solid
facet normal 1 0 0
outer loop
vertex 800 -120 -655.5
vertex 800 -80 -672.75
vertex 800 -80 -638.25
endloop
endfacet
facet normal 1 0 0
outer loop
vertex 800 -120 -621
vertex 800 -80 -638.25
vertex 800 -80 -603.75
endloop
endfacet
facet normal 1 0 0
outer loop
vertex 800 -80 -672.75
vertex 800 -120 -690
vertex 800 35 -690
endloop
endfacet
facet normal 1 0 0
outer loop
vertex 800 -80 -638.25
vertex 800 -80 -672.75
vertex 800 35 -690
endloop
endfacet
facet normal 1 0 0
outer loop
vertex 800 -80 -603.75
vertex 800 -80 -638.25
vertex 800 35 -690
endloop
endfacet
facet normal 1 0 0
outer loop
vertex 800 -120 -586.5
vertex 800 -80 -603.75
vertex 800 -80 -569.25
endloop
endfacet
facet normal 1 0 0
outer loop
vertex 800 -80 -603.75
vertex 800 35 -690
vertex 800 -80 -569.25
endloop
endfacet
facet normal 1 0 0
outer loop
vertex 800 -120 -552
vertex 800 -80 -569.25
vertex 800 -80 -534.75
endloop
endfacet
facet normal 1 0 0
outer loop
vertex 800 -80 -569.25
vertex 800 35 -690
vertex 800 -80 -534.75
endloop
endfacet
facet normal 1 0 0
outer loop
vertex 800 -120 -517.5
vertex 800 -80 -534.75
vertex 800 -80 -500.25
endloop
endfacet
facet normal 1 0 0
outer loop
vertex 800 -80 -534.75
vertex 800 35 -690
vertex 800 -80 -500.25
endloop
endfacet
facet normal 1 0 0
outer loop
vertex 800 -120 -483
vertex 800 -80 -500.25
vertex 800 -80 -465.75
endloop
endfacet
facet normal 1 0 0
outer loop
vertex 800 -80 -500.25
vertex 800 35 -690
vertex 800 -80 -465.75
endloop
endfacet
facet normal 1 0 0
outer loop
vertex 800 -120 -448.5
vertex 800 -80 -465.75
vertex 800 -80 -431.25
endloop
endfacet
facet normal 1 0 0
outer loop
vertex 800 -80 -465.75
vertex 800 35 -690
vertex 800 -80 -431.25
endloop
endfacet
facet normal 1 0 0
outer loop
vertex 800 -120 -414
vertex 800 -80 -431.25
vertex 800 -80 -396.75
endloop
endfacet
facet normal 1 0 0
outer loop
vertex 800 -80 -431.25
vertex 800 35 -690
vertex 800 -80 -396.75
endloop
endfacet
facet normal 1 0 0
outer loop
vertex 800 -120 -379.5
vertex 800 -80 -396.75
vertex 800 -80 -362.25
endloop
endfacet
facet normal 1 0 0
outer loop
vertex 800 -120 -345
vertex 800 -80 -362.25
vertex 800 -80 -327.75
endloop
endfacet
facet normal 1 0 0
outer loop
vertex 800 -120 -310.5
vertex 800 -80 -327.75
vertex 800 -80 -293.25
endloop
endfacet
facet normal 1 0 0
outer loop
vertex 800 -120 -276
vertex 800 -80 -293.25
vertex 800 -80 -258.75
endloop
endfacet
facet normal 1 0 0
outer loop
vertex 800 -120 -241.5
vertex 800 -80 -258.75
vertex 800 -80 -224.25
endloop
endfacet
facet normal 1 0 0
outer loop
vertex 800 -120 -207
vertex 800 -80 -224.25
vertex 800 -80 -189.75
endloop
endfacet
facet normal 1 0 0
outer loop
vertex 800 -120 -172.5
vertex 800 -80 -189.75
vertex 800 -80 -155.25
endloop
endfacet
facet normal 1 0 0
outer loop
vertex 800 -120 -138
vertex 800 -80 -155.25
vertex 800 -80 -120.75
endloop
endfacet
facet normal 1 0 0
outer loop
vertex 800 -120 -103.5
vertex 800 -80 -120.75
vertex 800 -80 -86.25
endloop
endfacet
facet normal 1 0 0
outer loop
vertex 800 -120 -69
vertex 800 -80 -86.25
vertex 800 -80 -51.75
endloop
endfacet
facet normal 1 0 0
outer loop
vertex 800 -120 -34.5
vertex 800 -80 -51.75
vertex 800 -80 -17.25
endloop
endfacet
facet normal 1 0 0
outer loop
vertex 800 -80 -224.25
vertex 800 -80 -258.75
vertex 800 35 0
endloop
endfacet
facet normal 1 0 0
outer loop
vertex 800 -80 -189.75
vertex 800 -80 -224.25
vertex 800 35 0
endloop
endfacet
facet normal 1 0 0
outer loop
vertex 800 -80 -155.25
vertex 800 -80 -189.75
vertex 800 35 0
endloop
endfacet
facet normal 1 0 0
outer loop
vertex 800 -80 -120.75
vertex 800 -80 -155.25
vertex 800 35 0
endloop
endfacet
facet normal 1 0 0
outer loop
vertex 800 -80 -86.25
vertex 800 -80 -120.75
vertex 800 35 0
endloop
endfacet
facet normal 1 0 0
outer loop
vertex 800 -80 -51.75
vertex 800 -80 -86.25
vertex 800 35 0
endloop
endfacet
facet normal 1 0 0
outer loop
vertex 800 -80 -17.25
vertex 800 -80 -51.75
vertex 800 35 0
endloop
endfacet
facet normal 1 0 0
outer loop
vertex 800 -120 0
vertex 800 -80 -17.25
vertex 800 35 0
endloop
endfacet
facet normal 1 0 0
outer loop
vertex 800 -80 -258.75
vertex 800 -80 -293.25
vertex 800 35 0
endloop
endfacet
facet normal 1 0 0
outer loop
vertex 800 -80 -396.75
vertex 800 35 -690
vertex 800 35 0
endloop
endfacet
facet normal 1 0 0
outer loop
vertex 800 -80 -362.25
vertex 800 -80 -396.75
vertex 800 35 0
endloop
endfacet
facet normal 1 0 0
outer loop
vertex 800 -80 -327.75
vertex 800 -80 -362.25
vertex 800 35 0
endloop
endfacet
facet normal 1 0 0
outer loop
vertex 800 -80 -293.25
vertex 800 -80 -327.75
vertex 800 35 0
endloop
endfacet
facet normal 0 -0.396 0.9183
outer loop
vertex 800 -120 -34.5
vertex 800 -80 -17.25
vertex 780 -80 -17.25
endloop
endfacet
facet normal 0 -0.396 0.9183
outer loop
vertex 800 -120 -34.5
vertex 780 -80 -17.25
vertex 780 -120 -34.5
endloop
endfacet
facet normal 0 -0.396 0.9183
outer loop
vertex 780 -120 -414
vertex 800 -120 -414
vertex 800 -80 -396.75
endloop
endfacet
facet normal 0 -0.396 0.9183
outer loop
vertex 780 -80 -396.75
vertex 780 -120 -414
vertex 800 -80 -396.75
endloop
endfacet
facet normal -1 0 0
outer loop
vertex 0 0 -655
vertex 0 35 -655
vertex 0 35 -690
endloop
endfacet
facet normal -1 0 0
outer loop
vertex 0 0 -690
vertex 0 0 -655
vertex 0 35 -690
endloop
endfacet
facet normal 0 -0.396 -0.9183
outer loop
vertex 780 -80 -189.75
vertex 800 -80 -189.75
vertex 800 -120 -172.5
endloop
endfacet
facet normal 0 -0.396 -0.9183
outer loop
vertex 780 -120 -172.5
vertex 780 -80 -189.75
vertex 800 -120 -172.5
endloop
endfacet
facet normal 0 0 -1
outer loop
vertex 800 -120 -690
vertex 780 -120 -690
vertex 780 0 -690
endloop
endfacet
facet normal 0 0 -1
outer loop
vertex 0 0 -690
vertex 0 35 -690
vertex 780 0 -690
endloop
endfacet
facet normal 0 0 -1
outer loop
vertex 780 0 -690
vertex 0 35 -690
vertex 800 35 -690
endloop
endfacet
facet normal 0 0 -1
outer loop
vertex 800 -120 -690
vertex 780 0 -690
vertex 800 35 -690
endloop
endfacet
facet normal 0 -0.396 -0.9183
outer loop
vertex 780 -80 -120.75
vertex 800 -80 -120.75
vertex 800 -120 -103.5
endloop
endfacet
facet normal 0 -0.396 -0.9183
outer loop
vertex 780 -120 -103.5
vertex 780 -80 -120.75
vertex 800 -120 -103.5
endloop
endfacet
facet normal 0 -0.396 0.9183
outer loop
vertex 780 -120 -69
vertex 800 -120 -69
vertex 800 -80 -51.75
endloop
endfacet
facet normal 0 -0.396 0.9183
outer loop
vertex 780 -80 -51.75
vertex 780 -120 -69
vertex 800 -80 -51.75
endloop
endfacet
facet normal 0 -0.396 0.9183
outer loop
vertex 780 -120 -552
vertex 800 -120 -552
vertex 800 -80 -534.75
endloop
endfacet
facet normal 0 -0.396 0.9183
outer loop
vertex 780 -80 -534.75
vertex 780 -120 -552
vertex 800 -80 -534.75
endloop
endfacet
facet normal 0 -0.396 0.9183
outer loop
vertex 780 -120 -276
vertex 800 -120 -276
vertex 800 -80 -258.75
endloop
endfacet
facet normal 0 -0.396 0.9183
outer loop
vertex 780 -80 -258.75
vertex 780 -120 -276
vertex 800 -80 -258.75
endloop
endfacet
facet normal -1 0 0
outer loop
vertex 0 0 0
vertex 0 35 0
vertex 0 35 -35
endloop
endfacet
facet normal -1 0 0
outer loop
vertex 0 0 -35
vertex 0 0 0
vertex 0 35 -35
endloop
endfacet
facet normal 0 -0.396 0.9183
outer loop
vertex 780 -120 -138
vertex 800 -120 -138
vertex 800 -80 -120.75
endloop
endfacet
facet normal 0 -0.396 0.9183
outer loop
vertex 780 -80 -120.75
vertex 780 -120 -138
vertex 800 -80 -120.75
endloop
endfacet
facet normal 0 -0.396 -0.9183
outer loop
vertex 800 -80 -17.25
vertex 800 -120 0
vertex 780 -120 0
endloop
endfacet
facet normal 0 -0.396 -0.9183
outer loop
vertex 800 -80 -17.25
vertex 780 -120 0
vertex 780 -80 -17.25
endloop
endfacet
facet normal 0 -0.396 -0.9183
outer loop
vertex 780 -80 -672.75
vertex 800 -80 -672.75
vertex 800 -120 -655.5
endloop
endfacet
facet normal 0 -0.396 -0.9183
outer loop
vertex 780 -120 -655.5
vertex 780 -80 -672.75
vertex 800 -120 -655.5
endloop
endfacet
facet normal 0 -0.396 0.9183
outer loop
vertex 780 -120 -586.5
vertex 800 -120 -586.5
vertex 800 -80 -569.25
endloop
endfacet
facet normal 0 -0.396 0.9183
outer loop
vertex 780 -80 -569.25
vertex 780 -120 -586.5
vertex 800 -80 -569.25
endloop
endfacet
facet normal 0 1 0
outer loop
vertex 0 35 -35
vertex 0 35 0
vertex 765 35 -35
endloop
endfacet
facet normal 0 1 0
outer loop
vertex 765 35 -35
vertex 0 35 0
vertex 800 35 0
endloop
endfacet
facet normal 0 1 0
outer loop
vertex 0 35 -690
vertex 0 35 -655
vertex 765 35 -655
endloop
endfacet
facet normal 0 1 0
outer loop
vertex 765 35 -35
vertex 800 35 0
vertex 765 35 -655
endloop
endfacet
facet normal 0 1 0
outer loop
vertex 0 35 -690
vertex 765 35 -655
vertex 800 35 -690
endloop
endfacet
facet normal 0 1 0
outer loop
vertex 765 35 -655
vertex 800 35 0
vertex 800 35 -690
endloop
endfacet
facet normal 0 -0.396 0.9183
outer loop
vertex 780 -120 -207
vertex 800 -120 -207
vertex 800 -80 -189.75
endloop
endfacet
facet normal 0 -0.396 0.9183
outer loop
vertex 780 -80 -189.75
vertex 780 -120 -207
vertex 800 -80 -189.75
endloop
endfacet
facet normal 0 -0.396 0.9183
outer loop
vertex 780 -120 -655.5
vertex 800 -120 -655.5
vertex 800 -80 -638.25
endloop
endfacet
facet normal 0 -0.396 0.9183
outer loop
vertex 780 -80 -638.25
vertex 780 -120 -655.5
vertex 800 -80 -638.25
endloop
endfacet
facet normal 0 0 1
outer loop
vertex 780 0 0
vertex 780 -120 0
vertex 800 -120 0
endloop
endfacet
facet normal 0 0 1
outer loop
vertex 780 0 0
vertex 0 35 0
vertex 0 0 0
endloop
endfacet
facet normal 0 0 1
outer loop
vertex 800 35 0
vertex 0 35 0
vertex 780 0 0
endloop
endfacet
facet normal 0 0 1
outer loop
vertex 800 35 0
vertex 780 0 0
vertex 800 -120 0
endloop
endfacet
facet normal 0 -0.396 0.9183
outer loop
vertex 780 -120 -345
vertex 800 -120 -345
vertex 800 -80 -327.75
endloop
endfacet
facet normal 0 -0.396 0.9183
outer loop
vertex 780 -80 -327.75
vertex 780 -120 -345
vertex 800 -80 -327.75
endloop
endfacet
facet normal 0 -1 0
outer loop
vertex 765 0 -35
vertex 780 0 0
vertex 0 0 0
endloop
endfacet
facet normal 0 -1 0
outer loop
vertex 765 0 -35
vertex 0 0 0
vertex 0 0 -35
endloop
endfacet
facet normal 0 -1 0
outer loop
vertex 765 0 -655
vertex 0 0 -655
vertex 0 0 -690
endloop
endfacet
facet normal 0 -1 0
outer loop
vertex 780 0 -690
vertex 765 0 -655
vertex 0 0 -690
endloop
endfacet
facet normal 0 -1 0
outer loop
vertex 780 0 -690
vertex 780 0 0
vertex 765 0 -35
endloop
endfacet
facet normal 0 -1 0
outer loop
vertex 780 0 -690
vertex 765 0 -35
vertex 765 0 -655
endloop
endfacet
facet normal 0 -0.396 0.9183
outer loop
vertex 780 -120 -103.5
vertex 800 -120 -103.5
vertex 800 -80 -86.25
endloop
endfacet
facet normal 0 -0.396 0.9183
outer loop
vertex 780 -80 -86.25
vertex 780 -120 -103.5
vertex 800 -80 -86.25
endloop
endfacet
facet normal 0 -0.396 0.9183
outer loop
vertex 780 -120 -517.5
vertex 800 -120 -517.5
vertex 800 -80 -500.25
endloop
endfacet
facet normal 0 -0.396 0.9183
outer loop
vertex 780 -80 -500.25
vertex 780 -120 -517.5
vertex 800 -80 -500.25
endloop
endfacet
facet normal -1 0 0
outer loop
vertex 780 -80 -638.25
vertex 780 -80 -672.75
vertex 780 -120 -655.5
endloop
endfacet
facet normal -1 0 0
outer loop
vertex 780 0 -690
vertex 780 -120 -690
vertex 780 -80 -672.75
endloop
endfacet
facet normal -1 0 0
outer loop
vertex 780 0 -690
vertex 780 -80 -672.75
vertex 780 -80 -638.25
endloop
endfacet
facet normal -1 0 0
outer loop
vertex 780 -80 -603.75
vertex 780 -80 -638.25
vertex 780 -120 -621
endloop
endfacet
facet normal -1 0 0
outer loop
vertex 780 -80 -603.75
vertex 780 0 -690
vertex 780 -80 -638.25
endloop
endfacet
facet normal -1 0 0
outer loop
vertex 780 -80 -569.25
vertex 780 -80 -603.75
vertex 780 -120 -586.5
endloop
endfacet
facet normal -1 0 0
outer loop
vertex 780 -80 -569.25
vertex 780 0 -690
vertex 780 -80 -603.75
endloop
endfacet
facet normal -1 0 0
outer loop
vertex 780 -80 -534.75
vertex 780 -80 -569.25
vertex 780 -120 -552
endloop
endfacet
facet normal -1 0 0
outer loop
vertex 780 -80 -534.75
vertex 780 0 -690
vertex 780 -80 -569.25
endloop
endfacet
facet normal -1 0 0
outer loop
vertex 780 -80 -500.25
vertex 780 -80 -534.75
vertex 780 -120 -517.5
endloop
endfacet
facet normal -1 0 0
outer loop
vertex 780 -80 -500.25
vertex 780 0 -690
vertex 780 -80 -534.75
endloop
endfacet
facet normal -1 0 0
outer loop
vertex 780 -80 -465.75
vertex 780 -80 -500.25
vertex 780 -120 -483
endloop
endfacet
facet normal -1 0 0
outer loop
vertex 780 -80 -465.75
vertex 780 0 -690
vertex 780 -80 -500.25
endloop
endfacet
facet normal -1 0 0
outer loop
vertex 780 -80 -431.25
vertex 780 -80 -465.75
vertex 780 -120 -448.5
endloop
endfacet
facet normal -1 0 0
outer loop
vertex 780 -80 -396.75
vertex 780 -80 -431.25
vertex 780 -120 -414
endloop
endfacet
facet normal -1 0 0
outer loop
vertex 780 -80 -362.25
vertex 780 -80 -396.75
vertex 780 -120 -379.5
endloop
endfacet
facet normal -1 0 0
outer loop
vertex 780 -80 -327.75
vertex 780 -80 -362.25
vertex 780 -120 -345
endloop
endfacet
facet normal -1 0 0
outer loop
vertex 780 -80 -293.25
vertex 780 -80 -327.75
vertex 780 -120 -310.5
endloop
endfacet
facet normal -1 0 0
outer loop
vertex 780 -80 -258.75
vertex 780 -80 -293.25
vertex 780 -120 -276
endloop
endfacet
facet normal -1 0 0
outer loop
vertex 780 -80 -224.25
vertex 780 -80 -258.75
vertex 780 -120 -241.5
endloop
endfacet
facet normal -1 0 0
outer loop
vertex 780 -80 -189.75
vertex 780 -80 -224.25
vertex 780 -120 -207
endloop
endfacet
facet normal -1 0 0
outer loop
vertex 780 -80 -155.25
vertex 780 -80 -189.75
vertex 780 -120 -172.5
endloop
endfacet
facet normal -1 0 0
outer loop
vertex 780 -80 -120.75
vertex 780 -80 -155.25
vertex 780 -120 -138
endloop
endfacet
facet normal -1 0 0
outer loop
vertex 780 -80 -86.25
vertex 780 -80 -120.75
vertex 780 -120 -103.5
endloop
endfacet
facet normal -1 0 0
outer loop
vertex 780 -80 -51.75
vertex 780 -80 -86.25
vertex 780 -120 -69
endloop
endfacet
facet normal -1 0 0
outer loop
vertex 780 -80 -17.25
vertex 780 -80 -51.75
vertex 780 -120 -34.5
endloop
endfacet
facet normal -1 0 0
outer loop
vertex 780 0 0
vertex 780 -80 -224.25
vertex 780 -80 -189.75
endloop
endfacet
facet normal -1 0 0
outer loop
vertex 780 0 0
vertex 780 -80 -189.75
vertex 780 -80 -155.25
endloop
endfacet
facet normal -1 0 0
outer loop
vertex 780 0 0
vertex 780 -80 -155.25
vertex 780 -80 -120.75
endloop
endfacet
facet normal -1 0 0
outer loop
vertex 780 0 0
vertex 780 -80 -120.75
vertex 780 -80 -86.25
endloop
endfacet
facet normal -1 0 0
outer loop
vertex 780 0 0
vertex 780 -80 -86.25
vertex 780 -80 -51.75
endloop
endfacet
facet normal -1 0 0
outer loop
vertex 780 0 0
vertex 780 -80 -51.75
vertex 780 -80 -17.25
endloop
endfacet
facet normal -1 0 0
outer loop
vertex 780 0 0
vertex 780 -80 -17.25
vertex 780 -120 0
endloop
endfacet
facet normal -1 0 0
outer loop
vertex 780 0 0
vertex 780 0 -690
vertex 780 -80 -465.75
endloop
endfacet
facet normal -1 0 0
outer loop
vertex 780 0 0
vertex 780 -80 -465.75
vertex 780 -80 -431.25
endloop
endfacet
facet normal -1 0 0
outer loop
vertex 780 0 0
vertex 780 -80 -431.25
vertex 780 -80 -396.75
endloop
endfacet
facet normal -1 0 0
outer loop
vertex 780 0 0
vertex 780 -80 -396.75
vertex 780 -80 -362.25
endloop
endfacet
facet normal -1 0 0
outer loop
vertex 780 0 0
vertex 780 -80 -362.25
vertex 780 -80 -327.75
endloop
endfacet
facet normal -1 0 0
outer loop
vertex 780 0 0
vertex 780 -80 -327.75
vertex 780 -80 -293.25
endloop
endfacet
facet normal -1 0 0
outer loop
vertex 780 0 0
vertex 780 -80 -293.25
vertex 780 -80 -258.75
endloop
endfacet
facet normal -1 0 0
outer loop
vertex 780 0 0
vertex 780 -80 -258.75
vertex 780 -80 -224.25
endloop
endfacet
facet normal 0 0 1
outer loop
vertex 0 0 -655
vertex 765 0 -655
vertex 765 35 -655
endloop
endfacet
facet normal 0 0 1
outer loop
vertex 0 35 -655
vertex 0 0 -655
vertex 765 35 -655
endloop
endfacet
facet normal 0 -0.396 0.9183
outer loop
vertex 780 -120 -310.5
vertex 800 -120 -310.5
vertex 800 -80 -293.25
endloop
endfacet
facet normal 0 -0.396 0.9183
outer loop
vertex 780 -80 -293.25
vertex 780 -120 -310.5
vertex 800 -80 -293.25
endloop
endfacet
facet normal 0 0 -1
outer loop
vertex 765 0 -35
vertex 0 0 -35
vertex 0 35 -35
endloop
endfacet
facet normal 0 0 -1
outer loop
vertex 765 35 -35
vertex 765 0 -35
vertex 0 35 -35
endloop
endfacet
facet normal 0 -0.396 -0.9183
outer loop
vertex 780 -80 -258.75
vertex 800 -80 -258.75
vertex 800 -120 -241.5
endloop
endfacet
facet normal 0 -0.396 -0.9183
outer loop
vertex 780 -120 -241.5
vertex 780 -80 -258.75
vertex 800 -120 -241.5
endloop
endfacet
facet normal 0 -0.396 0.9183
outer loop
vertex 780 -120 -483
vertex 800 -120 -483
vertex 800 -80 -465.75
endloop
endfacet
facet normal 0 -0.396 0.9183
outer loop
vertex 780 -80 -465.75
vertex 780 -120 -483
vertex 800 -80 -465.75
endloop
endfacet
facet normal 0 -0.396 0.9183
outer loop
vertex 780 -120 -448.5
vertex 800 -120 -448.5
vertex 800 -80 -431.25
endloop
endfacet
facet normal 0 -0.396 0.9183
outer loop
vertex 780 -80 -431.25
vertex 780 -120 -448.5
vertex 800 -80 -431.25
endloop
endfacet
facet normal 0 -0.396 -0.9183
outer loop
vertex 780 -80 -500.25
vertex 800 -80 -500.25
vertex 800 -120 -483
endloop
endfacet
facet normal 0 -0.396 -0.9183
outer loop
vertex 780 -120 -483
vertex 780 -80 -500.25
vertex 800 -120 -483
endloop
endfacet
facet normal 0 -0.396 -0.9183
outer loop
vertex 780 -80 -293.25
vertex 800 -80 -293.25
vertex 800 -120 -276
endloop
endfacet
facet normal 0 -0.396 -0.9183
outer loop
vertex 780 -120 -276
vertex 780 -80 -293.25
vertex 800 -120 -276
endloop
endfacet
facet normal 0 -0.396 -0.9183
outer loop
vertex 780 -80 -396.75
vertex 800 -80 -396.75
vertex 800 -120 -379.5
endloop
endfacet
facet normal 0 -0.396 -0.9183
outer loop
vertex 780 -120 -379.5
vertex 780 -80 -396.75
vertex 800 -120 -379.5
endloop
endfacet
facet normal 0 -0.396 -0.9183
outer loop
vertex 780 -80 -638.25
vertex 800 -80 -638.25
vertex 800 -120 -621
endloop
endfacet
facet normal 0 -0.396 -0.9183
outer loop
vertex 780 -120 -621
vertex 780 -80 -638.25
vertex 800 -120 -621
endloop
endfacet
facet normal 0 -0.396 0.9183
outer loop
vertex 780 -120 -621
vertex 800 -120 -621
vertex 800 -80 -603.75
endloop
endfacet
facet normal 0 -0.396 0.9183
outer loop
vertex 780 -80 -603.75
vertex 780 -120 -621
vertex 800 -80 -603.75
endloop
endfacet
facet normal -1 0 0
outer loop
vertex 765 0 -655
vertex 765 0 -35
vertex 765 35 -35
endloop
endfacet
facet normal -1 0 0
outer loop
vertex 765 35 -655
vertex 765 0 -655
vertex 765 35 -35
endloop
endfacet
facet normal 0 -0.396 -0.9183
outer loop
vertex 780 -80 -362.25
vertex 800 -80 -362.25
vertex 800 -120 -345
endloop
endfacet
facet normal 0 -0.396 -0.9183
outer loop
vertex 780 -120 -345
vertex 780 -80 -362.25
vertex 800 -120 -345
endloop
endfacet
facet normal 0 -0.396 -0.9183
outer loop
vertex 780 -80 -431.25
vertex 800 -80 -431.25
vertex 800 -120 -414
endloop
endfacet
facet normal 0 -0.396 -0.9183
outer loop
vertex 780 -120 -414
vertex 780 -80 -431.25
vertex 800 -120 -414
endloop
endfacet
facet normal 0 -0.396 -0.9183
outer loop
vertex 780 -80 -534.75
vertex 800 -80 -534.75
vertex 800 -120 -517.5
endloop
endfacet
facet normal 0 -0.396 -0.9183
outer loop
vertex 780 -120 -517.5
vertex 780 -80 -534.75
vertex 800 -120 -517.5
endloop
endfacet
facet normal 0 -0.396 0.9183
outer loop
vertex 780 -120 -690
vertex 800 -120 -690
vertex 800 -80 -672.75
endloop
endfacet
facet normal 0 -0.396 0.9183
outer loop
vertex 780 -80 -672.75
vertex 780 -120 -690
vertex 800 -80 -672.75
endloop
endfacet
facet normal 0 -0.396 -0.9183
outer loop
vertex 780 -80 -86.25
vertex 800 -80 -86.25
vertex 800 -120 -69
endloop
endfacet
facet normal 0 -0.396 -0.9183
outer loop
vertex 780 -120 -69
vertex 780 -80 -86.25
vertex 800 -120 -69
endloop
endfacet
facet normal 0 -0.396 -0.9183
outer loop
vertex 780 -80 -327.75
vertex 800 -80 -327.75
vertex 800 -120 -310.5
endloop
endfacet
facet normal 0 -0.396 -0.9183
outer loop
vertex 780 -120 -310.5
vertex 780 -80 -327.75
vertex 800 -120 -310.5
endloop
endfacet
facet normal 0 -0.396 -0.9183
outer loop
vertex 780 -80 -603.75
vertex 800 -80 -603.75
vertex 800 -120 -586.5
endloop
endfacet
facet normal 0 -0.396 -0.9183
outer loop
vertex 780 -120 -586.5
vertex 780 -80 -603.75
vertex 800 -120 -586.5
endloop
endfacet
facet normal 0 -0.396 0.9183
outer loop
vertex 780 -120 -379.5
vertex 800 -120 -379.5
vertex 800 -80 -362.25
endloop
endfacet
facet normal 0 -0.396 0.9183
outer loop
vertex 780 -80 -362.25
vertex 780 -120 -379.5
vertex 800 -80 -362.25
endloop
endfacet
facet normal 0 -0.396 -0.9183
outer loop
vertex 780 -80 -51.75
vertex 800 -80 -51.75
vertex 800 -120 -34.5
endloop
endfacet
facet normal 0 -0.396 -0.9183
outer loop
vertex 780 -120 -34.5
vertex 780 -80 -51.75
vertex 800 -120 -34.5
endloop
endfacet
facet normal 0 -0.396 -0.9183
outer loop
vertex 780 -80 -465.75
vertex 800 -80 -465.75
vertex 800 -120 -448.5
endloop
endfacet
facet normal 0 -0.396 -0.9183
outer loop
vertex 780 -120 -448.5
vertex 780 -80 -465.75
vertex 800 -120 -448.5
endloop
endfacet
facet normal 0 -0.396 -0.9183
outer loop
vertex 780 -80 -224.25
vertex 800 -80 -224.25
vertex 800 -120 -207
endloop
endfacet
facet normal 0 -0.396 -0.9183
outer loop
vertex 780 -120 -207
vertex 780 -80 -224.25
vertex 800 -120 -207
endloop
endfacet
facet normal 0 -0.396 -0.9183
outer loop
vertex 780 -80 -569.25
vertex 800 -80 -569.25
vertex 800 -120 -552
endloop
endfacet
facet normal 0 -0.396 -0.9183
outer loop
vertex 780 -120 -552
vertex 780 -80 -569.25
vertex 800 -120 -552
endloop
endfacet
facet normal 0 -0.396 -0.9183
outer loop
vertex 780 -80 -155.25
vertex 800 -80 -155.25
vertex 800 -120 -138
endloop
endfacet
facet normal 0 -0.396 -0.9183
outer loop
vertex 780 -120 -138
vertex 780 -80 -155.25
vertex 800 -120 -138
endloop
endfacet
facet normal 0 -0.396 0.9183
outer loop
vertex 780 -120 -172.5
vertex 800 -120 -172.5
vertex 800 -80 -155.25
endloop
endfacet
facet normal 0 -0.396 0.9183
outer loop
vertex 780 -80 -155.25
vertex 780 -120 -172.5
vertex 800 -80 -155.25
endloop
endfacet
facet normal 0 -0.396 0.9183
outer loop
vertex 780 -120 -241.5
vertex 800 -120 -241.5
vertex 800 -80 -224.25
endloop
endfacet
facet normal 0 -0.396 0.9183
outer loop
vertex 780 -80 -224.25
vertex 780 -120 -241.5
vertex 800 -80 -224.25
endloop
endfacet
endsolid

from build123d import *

# Parameters (mm, degrees)
SKETCH2_W           = 35
SKETCH2_H           = 35
BOSS_EXTRUDE1_DEPTH = 800
SKETCH3_W           = 35
SKETCH3_H           = 35
BOSS_EXTRUDE2_DEPTH = 620
SKETCH5_W           = 35
SKETCH5_H           = 35
BOSS_EXTRUDE3_DEPTH = 800
SKETCH6_W           = 20
SKETCH6_H           = 690
BOSS_EXTRUDE4_DEPTH = 120
CUT_EXTRUDE1_DEPTH  = 1064.249735481


with BuildPart() as part:
    # Sketch2 → Boss-Extrude1 (new body)
    with BuildSketch(Plane(origin=(0, 0, 0), x_dir=(0, 0, -1), z_dir=(1, 0, 0))):
        with Locations((17.5, 17.5)):
            Rectangle(SKETCH2_W, SKETCH2_H)
    extrude(amount=BOSS_EXTRUDE1_DEPTH)

    # Sketch3 → Boss-Extrude2 (add)
    with BuildSketch(Plane(origin=(0, 0, -35), x_dir=(-1, 0, 0), z_dir=(0, 0, -1))):
        with Locations((-782.5, 17.5)):
            Rectangle(SKETCH3_W, SKETCH3_H)
    extrude(amount=BOSS_EXTRUDE2_DEPTH)

    # Sketch5 → Boss-Extrude3 (add)
    with BuildSketch(Plane(origin=(800, 0, 0), x_dir=(0, 0, -1), z_dir=(1, 0, 0))):
        with Locations((672.5, 17.5)):
            Rectangle(SKETCH5_W, SKETCH5_H)
    extrude(amount=-BOSS_EXTRUDE3_DEPTH)

    # Sketch6 → Boss-Extrude4 (add)
    with BuildSketch(Plane.XZ):
        with Locations((790, -345)):
            Rectangle(SKETCH6_W, SKETCH6_H)
    extrude(amount=BOSS_EXTRUDE4_DEPTH)

    # Sketch7 → Cut-Extrude1 (cut, through all)
    with BuildSketch(Plane(origin=(800, 0, 0), x_dir=(0, 0, -1), z_dir=(1, 0, 0))):
        Polygon((51.75, -80), (34.5, -120), (69, -120), align=None)
        Polygon((86.25, -80), (69, -120), (103.5, -120), align=None)
        Polygon((120.75, -80), (103.5, -120), (138, -120), align=None)
        Polygon((155.25, -80), (138, -120), (172.5, -120), align=None)
        Polygon((189.75, -80), (172.5, -120), (207, -120), align=None)
        Polygon((224.25, -80), (207, -120), (241.5, -120), align=None)
        Polygon((258.75, -80), (241.5, -120), (276, -120), align=None)
        Polygon((293.25, -80), (276, -120), (310.5, -120), align=None)
        Polygon((327.75, -80), (310.5, -120), (345, -120), align=None)
        Polygon((362.25, -80), (345, -120), (379.5, -120), align=None)
        Polygon((396.75, -80), (379.5, -120), (414, -120), align=None)
        Polygon((431.25, -80), (414, -120), (448.5, -120), align=None)
        Polygon((465.75, -80), (448.5, -120), (483, -120), align=None)
        Polygon((500.25, -80), (483, -120), (517.5, -120), align=None)
        Polygon((534.75, -80), (517.5, -120), (552, -120), align=None)
        Polygon((569.25, -80), (552, -120), (586.5, -120), align=None)
        Polygon((603.75, -80), (586.5, -120), (621, -120), align=None)
        Polygon((638.25, -80), (621, -120), (655.5, -120), align=None)
        Polygon((672.75, -80), (655.5, -120), (690, -120), align=None)
        Polygon((17.25, -80), (34.5, -120), (0, -120), align=None)
    extrude(amount=-CUT_EXTRUDE1_DEPTH, mode=Mode.SUBTRACT)


solid = part.part
